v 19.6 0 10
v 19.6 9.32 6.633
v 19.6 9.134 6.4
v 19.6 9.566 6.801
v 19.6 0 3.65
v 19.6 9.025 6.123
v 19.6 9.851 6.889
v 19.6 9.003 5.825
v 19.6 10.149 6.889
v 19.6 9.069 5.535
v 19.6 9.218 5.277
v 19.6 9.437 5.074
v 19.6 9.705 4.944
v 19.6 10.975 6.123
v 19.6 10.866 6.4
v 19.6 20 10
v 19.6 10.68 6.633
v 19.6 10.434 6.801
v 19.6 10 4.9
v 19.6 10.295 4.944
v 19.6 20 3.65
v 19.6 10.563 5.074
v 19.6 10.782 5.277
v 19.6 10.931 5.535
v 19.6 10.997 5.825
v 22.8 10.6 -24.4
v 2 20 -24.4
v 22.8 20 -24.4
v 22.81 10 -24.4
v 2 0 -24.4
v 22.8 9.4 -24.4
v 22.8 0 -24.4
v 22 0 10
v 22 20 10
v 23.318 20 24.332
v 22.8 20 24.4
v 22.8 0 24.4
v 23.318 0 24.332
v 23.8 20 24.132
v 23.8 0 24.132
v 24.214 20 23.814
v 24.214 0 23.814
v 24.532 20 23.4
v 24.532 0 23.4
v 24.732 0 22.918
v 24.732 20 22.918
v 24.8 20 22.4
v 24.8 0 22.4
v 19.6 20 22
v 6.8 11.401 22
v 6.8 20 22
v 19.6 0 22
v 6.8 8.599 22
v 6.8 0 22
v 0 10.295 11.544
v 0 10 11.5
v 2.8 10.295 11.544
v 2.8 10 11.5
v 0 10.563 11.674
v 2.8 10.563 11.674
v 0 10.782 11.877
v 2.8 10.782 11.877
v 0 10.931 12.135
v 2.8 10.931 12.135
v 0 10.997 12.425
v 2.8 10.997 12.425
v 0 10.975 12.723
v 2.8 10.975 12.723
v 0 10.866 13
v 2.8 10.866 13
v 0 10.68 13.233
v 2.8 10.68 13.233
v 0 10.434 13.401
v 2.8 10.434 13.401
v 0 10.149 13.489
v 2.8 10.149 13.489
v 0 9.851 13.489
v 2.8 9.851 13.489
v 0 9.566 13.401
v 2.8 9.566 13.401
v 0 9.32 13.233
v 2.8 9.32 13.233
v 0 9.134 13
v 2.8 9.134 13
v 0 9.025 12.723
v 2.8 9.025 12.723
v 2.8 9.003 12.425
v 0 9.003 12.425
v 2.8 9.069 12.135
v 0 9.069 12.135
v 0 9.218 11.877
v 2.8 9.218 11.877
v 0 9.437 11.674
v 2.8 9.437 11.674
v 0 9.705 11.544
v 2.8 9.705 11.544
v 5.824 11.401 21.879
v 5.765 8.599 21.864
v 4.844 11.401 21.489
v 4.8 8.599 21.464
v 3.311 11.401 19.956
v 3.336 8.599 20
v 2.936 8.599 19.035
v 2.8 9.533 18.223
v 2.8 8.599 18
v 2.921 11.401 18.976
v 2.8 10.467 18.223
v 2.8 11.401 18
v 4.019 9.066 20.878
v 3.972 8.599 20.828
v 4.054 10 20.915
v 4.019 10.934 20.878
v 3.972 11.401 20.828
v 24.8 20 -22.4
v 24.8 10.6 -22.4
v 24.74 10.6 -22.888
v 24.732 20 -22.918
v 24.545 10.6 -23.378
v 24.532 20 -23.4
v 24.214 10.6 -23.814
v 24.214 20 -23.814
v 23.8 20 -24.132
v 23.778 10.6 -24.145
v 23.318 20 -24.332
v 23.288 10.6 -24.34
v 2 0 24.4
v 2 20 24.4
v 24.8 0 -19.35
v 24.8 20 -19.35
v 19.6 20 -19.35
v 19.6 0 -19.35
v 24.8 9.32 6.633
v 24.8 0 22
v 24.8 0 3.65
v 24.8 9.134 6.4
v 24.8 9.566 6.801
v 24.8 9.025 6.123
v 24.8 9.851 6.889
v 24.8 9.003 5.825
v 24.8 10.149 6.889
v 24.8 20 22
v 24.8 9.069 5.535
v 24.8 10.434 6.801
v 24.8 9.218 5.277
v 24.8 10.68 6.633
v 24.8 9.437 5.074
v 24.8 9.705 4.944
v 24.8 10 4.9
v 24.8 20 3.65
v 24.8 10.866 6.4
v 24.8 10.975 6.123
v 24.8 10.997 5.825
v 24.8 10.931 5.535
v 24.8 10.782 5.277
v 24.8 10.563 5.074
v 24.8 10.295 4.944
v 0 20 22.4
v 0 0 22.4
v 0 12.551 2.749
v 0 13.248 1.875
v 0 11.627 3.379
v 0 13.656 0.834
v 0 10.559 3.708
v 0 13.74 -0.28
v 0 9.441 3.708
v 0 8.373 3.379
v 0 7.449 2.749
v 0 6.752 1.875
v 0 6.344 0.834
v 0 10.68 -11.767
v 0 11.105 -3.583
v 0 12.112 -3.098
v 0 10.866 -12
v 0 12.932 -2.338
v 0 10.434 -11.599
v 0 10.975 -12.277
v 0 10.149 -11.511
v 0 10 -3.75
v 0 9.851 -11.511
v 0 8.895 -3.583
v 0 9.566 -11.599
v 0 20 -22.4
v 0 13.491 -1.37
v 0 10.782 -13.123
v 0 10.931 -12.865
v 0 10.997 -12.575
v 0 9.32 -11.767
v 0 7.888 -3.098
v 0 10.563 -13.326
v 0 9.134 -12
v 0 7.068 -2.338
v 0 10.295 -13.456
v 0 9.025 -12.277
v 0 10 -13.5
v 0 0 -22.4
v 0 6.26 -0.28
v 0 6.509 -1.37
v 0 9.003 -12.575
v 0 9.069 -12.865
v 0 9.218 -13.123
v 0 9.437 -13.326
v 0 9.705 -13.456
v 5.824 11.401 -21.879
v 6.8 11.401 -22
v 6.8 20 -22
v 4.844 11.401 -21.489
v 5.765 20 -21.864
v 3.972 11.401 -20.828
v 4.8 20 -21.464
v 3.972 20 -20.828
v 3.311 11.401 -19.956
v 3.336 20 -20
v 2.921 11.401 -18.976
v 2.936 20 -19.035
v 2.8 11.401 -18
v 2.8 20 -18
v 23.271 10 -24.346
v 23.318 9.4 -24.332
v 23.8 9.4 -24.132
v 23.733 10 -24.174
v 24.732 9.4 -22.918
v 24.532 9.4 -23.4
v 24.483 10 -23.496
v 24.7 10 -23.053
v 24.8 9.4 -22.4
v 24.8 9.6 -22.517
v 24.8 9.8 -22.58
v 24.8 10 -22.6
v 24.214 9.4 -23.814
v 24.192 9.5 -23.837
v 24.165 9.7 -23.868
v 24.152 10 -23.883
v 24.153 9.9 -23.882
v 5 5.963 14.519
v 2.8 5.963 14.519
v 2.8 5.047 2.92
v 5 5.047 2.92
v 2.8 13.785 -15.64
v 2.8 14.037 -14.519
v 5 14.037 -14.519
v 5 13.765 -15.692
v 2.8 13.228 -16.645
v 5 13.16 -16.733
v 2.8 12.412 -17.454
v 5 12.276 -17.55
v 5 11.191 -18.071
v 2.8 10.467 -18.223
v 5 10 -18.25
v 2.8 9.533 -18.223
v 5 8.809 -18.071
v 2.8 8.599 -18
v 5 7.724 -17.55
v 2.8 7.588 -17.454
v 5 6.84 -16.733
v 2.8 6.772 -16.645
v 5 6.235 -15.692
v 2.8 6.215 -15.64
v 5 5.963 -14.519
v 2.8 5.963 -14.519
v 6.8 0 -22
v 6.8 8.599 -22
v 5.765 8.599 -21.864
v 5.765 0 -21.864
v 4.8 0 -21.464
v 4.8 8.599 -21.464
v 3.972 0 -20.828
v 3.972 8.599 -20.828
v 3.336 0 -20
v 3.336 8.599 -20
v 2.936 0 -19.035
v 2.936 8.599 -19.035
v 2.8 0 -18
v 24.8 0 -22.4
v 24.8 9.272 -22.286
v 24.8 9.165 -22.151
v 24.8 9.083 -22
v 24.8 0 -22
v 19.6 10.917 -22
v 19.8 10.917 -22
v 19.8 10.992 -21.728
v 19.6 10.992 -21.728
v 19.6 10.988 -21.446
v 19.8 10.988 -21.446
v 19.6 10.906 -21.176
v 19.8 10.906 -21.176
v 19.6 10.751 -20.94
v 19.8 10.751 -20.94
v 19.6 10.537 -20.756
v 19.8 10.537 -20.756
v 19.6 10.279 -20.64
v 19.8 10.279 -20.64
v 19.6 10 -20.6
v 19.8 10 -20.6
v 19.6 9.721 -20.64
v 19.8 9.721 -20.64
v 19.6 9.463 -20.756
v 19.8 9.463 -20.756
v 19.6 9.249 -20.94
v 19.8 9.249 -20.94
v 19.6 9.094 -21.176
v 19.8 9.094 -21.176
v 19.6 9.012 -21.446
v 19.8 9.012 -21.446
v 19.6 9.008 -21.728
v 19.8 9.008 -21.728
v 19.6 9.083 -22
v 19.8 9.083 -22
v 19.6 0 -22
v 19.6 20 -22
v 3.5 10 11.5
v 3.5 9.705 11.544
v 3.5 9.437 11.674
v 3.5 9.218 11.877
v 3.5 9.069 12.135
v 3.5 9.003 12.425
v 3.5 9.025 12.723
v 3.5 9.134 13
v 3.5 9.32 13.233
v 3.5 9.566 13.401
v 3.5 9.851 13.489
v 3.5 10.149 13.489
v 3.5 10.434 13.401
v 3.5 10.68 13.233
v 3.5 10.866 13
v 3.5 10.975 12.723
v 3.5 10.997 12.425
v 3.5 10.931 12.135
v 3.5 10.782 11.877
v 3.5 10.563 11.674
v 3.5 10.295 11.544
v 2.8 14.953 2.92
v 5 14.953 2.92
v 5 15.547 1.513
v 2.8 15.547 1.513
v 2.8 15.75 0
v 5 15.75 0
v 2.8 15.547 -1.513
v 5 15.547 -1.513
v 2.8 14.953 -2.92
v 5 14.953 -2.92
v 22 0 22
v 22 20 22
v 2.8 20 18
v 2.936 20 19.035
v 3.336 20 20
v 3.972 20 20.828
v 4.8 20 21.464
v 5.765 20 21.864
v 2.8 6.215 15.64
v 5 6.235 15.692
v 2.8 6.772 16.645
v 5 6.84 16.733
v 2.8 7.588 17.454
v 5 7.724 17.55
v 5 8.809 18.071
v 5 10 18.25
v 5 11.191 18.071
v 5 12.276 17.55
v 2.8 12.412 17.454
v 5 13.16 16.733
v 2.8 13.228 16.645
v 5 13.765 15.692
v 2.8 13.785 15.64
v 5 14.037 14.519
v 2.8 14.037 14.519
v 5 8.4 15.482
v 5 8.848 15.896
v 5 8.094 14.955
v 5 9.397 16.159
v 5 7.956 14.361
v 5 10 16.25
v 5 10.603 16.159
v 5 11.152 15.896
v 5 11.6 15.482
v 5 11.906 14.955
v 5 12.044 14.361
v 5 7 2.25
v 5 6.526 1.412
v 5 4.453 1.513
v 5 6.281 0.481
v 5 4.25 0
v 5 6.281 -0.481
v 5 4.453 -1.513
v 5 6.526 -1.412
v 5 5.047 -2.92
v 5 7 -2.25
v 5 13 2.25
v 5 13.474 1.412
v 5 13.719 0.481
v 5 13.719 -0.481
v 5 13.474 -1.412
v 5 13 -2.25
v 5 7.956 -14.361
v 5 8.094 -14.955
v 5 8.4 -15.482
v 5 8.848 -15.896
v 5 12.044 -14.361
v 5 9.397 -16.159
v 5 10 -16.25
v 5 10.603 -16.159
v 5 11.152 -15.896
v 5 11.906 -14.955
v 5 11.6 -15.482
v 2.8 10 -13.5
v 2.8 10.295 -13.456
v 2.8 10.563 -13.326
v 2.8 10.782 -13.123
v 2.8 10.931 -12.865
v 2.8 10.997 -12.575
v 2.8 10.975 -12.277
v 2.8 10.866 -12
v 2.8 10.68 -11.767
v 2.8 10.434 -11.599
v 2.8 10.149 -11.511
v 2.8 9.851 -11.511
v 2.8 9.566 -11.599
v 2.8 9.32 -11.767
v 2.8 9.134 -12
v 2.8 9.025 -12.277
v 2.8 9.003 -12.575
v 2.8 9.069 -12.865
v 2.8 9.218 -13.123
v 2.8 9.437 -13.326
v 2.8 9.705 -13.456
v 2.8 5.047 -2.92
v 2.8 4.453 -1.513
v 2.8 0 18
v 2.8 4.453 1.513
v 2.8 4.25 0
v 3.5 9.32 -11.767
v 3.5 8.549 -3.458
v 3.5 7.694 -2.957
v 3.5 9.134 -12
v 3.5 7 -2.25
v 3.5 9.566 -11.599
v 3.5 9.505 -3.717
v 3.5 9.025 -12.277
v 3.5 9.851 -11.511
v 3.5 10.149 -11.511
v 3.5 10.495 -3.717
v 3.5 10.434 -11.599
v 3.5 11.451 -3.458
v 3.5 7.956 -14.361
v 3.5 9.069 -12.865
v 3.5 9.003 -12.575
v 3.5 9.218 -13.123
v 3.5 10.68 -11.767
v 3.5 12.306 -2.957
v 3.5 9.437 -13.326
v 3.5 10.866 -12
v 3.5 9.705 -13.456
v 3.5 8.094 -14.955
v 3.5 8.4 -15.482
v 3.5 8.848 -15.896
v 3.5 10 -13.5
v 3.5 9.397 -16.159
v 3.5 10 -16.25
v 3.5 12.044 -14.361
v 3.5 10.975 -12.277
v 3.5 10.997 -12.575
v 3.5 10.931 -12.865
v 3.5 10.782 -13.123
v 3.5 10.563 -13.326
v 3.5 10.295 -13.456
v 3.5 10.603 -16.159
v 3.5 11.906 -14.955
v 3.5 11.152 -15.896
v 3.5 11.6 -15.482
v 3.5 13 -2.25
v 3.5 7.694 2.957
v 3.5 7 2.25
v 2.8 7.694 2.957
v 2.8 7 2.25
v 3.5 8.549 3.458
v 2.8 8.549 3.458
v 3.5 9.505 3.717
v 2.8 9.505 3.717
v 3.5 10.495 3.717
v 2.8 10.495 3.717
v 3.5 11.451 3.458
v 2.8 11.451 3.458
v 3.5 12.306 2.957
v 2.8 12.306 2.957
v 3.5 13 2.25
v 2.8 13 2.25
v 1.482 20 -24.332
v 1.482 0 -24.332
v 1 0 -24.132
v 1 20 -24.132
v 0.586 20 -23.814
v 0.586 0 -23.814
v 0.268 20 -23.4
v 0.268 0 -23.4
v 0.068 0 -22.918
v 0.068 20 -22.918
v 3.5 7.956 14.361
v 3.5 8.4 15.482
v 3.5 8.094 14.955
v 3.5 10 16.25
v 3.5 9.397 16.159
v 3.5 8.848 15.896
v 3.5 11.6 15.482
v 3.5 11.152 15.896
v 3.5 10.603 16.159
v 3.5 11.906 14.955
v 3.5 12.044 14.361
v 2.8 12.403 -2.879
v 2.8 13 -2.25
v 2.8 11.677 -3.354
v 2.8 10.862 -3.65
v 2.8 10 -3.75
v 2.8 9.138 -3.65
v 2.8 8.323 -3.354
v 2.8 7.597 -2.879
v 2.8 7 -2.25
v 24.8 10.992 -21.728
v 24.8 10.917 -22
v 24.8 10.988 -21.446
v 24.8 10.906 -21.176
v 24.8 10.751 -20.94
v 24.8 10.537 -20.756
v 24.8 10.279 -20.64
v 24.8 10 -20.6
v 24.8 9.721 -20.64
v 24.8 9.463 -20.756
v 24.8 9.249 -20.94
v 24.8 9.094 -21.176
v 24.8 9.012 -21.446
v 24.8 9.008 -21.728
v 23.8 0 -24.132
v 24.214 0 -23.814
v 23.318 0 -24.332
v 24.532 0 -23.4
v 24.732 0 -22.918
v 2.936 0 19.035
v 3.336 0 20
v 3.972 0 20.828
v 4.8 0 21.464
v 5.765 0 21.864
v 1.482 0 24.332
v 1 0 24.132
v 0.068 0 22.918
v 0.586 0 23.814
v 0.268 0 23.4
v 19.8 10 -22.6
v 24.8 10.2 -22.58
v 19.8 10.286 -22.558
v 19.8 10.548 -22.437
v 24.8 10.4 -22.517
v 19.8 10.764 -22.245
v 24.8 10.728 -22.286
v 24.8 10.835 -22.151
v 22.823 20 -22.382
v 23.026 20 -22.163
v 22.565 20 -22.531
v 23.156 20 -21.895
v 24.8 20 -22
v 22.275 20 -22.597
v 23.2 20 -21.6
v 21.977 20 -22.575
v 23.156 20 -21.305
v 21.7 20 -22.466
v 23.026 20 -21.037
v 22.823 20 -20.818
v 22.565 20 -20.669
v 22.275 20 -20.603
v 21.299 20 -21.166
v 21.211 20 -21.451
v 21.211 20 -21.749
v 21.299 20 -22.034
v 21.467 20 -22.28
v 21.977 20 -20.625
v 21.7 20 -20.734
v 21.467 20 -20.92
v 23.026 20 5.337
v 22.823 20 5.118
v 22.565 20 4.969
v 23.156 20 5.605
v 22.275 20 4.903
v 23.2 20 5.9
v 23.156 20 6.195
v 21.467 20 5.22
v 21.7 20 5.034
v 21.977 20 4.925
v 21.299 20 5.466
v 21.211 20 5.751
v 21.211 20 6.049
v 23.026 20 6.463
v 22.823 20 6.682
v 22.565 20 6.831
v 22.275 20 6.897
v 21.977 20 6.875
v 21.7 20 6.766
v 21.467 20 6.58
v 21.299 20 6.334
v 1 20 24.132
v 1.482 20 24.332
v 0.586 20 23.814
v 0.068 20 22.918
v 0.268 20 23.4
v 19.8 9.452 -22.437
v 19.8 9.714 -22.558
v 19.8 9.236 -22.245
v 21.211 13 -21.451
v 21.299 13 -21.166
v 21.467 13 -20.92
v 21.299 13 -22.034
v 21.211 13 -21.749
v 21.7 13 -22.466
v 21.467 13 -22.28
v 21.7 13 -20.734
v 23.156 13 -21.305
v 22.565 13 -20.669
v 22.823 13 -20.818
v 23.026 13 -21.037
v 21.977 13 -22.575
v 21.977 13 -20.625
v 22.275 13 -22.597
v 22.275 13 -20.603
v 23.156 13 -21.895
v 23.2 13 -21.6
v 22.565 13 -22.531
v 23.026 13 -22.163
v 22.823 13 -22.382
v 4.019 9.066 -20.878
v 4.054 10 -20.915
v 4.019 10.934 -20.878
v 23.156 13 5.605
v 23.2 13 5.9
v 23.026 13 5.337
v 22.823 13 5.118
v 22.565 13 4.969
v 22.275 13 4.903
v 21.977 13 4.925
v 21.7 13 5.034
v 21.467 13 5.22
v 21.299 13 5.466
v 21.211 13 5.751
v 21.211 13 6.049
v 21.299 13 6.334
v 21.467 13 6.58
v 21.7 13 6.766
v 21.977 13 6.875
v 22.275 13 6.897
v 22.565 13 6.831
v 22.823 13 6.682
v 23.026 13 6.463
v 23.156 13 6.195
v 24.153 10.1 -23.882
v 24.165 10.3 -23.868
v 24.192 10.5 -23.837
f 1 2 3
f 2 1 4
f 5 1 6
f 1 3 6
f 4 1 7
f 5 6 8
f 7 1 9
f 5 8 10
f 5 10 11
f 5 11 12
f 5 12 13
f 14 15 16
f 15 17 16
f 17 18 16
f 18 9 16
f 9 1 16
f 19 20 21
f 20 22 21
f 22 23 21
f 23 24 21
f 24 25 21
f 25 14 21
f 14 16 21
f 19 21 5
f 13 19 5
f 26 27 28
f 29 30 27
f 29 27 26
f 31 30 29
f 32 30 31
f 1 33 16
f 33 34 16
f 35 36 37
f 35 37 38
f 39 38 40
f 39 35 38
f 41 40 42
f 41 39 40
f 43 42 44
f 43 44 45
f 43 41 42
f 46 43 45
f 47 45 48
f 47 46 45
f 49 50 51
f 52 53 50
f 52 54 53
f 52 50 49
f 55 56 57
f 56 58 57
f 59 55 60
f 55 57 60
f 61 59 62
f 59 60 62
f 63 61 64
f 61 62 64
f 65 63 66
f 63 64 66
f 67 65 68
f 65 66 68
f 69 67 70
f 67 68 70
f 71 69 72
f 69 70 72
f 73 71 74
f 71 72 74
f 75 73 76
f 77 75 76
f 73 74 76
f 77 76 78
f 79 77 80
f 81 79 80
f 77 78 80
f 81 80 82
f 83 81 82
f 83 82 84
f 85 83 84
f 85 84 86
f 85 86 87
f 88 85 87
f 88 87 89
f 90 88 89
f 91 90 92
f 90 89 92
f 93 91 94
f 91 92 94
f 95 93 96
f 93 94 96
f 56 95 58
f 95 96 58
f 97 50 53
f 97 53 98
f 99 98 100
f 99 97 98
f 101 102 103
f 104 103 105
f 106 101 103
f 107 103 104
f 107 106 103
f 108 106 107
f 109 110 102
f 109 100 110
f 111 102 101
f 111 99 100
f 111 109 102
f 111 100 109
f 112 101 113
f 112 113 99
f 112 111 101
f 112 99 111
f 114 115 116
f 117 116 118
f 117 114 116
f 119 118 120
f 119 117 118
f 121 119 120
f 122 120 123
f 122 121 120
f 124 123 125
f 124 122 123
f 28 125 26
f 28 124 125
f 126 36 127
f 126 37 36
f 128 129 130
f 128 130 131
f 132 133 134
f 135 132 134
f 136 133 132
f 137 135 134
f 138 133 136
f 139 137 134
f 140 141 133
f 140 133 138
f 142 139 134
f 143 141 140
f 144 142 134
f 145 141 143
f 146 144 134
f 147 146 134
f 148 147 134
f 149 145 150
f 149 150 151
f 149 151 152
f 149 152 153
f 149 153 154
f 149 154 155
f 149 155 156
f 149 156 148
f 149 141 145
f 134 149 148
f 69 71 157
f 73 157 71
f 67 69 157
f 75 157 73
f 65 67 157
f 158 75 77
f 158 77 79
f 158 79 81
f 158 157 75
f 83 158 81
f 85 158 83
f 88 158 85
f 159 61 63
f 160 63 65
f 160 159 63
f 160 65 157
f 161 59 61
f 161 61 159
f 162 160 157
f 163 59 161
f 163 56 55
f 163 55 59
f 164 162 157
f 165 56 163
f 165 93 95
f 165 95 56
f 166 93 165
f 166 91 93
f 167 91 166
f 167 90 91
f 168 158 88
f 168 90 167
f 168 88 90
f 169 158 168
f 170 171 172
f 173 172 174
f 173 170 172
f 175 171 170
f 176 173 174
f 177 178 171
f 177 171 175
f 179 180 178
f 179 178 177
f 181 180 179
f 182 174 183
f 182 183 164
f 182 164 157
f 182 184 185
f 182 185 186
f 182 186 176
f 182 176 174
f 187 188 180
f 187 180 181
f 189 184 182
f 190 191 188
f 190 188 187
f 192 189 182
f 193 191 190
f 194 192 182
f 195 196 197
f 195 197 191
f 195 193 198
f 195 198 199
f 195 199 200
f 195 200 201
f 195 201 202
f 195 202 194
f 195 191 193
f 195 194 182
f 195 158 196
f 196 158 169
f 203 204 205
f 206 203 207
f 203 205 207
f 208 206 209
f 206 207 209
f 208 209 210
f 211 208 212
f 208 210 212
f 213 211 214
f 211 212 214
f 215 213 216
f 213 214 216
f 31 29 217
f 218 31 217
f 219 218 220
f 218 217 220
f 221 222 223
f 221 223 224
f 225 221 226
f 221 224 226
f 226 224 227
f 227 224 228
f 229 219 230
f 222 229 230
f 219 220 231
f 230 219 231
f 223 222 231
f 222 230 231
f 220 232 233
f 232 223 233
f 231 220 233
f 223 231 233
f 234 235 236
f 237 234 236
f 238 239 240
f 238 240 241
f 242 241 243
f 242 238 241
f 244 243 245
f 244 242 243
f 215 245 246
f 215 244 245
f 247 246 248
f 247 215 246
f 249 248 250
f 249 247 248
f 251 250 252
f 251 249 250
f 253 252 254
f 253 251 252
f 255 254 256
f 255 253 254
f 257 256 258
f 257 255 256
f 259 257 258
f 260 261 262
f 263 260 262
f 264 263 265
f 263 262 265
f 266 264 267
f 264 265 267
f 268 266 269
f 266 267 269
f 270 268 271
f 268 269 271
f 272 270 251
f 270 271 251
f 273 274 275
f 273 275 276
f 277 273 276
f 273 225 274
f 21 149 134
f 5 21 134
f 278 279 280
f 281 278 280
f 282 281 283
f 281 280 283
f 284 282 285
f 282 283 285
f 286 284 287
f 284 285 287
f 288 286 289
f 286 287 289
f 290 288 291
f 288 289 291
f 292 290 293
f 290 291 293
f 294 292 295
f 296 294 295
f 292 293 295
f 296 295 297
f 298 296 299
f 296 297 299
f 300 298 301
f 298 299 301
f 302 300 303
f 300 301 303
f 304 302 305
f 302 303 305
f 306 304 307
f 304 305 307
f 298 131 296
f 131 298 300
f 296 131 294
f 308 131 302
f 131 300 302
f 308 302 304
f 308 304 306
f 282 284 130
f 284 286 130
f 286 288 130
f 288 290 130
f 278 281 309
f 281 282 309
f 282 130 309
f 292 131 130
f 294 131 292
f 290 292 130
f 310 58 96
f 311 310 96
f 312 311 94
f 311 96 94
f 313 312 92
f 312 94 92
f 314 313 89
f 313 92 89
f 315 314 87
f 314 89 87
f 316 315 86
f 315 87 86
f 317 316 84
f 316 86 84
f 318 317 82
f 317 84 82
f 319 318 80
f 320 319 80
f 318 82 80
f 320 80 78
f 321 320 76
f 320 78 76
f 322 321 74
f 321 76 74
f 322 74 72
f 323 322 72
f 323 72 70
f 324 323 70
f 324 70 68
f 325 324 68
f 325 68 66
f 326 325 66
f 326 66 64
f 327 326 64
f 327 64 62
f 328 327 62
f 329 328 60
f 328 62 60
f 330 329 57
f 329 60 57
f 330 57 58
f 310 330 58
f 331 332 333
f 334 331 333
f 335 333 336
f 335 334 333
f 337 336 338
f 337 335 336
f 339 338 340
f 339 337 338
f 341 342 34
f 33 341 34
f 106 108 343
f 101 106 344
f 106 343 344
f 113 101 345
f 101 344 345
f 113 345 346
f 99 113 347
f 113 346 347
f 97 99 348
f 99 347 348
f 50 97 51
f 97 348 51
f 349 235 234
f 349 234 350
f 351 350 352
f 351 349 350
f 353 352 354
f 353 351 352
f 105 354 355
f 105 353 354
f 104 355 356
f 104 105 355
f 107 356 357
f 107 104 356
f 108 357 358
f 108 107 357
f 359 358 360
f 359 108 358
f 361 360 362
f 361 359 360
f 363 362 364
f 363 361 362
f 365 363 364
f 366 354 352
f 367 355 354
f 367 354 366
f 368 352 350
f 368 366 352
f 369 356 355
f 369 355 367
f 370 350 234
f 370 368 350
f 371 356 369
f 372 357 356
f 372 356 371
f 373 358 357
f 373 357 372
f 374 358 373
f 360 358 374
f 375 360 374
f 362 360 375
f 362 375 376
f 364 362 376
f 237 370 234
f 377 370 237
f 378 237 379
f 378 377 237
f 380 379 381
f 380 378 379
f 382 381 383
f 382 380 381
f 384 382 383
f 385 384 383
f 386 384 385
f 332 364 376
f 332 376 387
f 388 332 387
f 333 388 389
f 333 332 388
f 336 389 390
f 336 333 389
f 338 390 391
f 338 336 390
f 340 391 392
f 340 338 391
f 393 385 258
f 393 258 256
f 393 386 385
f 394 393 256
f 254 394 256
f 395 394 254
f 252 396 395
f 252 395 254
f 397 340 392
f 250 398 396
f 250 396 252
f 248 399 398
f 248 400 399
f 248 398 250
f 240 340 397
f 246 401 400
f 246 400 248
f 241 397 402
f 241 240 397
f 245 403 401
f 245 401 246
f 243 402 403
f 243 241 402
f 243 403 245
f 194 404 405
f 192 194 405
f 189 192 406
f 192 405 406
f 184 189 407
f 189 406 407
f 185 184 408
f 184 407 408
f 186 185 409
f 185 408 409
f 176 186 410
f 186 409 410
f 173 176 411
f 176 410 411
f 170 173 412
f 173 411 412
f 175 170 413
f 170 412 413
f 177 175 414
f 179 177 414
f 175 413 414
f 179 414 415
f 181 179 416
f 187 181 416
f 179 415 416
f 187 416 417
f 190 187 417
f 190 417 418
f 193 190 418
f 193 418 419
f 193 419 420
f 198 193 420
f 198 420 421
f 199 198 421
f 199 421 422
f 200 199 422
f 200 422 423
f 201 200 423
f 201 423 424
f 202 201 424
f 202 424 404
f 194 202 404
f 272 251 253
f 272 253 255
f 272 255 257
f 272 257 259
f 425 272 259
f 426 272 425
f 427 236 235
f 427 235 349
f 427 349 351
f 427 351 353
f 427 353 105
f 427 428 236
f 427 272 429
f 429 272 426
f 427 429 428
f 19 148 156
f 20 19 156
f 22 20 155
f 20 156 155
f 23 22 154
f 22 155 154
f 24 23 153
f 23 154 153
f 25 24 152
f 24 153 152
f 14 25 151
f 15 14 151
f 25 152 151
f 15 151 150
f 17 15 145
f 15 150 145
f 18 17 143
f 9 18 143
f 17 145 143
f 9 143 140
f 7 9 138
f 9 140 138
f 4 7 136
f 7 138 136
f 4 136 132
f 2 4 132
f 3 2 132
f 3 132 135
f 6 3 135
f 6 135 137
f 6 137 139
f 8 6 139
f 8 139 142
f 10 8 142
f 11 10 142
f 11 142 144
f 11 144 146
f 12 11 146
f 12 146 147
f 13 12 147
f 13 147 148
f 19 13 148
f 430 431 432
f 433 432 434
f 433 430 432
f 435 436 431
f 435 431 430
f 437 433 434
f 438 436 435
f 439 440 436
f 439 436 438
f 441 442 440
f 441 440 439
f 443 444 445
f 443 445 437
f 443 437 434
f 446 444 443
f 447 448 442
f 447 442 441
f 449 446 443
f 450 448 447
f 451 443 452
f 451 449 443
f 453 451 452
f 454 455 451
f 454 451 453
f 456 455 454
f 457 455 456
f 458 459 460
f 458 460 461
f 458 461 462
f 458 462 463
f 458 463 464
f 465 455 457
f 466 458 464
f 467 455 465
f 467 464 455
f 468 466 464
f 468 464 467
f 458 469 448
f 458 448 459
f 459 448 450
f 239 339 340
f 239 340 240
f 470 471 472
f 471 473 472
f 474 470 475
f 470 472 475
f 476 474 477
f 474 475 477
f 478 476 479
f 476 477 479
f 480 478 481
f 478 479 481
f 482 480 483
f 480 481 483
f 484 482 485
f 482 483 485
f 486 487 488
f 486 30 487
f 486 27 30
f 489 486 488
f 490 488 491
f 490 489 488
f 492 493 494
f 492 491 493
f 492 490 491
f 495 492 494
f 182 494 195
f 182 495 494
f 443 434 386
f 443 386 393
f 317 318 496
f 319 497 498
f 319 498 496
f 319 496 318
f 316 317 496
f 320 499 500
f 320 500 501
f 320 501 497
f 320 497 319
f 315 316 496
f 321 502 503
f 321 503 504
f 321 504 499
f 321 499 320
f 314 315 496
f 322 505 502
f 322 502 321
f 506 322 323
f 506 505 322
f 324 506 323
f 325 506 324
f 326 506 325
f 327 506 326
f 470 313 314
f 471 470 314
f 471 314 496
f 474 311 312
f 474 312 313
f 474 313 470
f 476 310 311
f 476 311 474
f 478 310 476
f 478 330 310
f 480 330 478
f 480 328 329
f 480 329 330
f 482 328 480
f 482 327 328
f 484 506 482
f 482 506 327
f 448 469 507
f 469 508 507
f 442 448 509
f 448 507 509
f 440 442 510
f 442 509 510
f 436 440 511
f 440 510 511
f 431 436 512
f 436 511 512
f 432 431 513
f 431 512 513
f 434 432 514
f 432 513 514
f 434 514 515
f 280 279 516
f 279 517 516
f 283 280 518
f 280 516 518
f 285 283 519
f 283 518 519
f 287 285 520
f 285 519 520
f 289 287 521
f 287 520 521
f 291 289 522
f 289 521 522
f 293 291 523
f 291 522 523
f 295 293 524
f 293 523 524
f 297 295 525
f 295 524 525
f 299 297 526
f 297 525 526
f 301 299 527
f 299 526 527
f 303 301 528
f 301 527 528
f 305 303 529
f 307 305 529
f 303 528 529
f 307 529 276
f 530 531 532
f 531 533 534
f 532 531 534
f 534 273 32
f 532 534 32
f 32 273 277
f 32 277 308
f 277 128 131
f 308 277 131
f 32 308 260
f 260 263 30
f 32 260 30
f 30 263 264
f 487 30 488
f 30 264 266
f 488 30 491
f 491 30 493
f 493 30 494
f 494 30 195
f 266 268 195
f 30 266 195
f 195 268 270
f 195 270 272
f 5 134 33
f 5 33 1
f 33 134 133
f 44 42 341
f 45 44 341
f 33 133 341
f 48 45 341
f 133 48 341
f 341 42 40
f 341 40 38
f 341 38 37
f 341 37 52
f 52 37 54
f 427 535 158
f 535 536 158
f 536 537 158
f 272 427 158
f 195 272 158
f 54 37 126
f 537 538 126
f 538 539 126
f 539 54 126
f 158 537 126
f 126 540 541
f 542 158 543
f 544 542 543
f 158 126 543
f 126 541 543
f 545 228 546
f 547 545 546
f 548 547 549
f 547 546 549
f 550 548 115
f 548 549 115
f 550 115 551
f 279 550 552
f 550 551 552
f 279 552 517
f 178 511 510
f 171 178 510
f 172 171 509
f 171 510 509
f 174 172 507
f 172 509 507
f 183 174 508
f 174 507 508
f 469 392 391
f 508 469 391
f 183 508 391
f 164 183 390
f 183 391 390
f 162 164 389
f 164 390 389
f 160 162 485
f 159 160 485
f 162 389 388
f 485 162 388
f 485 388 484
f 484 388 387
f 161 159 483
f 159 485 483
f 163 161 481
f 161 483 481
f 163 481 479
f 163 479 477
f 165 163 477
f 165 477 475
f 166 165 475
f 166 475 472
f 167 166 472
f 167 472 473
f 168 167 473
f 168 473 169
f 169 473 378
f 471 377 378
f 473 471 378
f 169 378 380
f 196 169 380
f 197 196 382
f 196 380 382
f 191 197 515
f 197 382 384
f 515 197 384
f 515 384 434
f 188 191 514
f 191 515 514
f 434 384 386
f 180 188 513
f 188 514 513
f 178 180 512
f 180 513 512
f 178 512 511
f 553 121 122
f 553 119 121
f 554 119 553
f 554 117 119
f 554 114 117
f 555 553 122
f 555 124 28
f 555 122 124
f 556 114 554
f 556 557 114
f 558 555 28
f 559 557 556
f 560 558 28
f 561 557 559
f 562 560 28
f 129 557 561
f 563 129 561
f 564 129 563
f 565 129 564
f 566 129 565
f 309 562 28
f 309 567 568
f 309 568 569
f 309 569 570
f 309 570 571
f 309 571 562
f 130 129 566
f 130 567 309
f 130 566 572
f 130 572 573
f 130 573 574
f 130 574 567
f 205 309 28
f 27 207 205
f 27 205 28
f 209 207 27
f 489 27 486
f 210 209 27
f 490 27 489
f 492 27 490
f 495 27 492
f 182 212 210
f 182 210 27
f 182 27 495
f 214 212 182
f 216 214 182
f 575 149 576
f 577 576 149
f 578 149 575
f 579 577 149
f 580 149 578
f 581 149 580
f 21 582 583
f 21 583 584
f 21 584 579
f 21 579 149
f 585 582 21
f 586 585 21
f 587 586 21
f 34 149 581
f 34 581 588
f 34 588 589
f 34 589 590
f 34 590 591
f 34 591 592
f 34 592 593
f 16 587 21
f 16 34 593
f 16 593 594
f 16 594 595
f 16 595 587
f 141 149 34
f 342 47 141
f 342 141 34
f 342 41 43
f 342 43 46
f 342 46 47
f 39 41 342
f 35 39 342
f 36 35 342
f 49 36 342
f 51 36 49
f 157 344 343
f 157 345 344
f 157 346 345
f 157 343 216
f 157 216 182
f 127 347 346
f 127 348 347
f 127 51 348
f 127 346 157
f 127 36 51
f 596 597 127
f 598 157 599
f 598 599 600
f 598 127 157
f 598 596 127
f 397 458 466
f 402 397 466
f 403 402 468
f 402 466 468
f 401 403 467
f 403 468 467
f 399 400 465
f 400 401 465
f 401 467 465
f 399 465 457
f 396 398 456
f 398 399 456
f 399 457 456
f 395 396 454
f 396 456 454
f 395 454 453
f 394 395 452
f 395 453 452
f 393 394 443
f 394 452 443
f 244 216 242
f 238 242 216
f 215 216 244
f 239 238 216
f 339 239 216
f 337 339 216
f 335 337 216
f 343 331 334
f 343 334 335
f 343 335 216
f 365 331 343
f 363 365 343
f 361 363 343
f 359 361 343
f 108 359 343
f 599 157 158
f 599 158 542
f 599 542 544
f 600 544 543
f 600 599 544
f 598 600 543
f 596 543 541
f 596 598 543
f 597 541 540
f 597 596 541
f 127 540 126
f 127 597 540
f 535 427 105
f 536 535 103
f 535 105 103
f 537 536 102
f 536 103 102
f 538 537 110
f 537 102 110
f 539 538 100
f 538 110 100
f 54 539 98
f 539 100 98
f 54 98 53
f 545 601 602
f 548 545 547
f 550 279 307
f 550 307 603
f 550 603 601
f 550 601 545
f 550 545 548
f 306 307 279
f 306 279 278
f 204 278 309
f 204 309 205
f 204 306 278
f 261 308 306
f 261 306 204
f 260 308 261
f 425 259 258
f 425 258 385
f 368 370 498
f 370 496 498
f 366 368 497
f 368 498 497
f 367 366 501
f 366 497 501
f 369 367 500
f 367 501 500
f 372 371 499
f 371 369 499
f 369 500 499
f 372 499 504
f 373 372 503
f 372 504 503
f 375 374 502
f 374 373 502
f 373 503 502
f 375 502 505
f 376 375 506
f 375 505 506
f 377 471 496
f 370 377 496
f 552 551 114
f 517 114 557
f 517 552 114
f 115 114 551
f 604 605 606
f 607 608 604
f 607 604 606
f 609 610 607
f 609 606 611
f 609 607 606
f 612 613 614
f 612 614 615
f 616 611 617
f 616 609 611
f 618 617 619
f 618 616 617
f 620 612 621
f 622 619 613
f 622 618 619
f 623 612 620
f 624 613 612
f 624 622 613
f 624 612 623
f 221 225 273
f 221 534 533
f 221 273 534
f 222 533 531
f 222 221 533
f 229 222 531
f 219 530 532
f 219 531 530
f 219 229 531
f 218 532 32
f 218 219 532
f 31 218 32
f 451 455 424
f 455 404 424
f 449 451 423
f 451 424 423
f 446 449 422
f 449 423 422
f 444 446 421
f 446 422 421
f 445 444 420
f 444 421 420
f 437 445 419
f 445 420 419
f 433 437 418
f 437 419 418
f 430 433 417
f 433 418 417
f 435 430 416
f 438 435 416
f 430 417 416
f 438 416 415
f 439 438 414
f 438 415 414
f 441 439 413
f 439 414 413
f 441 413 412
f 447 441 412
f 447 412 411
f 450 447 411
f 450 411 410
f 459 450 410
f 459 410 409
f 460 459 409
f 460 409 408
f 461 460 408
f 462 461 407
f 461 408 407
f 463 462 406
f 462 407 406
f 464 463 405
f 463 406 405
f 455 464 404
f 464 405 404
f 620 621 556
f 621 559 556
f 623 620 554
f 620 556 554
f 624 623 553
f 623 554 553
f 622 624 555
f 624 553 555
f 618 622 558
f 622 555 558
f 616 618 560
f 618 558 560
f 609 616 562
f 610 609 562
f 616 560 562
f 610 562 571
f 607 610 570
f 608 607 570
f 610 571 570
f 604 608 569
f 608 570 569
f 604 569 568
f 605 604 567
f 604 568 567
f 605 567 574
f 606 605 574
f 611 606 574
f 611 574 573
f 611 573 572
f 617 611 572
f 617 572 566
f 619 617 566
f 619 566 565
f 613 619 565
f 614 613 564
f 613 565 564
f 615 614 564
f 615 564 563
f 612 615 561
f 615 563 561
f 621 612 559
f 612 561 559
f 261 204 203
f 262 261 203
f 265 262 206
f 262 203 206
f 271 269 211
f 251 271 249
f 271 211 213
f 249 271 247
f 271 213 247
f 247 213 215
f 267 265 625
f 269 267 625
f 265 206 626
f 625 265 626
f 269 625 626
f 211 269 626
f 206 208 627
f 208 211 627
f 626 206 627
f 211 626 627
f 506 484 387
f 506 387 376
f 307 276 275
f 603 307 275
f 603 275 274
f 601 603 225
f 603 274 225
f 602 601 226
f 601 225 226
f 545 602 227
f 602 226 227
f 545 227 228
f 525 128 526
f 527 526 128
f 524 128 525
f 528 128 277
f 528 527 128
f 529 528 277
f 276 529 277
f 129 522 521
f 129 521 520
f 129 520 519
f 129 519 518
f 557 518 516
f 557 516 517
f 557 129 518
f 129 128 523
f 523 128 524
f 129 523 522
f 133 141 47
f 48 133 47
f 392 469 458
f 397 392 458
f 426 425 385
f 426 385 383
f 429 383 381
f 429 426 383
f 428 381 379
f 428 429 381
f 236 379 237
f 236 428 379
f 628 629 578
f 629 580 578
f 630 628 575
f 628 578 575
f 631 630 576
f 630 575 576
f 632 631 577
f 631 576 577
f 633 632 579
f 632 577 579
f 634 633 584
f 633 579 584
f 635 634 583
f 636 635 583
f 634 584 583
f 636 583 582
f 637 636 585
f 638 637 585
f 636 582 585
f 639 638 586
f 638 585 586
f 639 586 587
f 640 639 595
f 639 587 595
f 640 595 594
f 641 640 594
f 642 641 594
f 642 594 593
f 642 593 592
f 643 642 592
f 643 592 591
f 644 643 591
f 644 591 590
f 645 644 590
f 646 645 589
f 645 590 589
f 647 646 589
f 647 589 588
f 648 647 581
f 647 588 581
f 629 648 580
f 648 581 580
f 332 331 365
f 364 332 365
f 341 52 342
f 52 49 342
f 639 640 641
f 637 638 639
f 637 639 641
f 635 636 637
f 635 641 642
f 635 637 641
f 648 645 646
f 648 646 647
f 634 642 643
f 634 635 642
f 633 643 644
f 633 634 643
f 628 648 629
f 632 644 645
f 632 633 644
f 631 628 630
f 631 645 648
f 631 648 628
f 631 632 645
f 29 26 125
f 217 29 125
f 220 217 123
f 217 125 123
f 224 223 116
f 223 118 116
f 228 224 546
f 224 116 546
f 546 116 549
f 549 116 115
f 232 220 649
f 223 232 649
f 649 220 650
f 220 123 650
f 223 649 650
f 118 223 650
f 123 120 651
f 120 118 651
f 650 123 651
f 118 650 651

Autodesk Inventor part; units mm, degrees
ref_plane "YZ Plane" through (0, 0, 0) normal (1, 0, 0) x (0, 1, 0)
ref_plane "XZ Plane" through (0, 0, 0) normal (0, 1, 0) x (-1, 0, 0)
ref_plane "XY Plane" through (0, 0, 0) normal (0, 0, 1) x (1, 0, 0)
sketch "スケッチ1" plane through (0, 0, 0) normal (0, 1, 0) x (-1, 0, 0)
  line L0 (34.0614, 0) -> (-44.6235, 0)
  line L1 (0, 24.4) -> (0, -24.4)
  line L2 (0, -24.4) -> (-24.8, -24.4)
  line L3 (-24.8, -24.4) -> (-24.8, -22)
  line L4 (-24.8, -22) -> (-2.8, -22)
  line L5 (-2.8, -22) -> (-2.8, 22)
  line L6 (-2.8, 22) -> (-24.8, 22)
  line L7 (-24.8, 22) -> (-24.8, 24.4)
  line L8 (-24.8, 24.4) -> (0, 24.4)
  point P0 (0, 0)
  dimension "d0" = 2.8
  dimension "d1" = 48.8
  dimension "d2" = 24.4
  dimension "d3" = 2.4
  dimension "d4" = 2.4
  dimension "d5" = 22
extrude "押し出し1" add sketch "スケッチ1" along normal blind 20
sketch "スケッチ2" plane through (2.8, 0, 22) normal (1, 0, 0) x (0, 0, -1)
  line L0 (0, 20) -> (44, 20) projected
  line L1 (22, 20) -> (22, 0)
  line L2 (0, 0) -> (44, 0) projected
  line L3 (-2.4, 0) -> (-2.4, 20) projected
  line L4 (-2.4, 10) -> (46.4, 10)
  line L5 (46.4, 0) -> (46.4, 20) projected
  circle A0 centre (22, 10) radius 3.75
  arc A1 (7.6386, 12.0436) -> (7.6386, 7.9564) centre (7.8, 10) ccw
  line L6 (19.75, 13) -> (7.6386, 12.0436)
  line L7 (19.75, 7) -> (7.6386, 7.9564)
  circle A2 centre (9.5, 10) radius 1
  arc A3 (36.3614, 7.9564) -> (36.3614, 12.0436) centre (36.2, 10) ccw
  line L8 (24.25, 13) -> (36.3614, 12.0436)
  line L9 (24.25, 7) -> (36.3614, 7.9564)
  circle A4 centre (34.5, 10) radius 1
  line L10 (19.0799, 14.9533) -> (7.4812, 14.0374)
  arc A5 (7.4812, 14.0374) -> (7.4812, 5.9626) centre (7.8, 10) ccw
  line L11 (7.4812, 5.9626) -> (19.0799, 5.0467)
  circle A6 centre (22, 10) radius 5.75
  line L12 (24.9201, 14.9533) -> (36.5188, 14.0374)
  arc A7 (36.5188, 5.9626) -> (36.5188, 14.0374) centre (36.2, 10) ccw
  line L13 (36.5188, 5.9626) -> (24.9201, 5.0467)
  point P0 (18.25, 10)
  point P1 (22, 6.25)
  point P2 (24.25, 13)
  point P3 (24.25, 7)
  point P4 (19.75, 7)
  point P5 (27.0332, 12.7802)
  point P6 (27.0332, 7.2198)
  point P7 (16.9668, 12.7802)
  point P8 (16.9668, 7.2198)
  dimension "d9" = 7.5
  dimension "d8" = 24.4
  dimension "d10" = 6
  dimension "d11" = 14.2
  dimension "d12" = 2.05
  dimension "d13" = 2
  dimension "d14" = 12.5
  dimension "d34" = 2
  dimension "d35" = 2
  dimension "d36" = 2
extrude "押し出し2" cut sketch "スケッチ2" against normal through all contours A0 L4 L1 | L1 L4 A0 | L4 A0 L1 | L1 A0 L4 | A4 L4 | L4 A4 | A2 L4 | L4 A2
extrude "押し出し6" add sketch "スケッチ2" along normal blind 2.2 contours A6 L8 A0 L1 | L1 A0 L6 A6 | L12 A7 L4 A3 L8 A6 | A6 L6 A1 L4 A5 L10 | A0 L9 A6 L1 | L1 A6 L7 A0 | A7 L13 A6 L9 A3 L4 | L4 A1 L7 A6 L11 A5
extrude "押し出し3" add sketch "スケッチ2" along normal blind 0.7 contours L8 A6 L4 A0 | A0 L4 A6 L6 | L8 A3 L4 A4 A6 | A6 L4 A2 A1 L6 | A0 L7 A6 L4 | L4 A6 L9 A0 | L4 A4 A3 L9 A6 | A6 L7 A1 L4 A2
sketch "スケッチ3" plane through (24.8, 0, -22) normal (1, 0, 0) x (0, 0, -1)
  line L0 (-46.4, 0) -> (-46.4, 20) projected
  line L1 (2.4, 0) -> (-46.4, 0) projected
  line L2 (-46.4, 20) -> (-25.65, 20)
  line L3 (-25.65, 20) -> (-25.65, 0)
  line L4 (-25.65, 0) -> (-46.4, 0)
  line L5 (-46.4, 0) -> (-46.4, 20)
  line L6 (2.4, 20) -> (-46.4, 20) projected
  line L7 (2.4, 20) -> (-2.65, 20)
  line L8 (-2.65, 20) -> (-2.65, 0)
  line L9 (-2.65, 0) -> (2.4, 0)
  line L10 (2.4, 0) -> (2.4, 20)
  line L11 (-46.4, 10) -> (2.4, 10)
  line L12 (-19.4, 20) -> (-19.4, 0)
  circle A0 centre (-27.9, 10) radius 1
  circle A1 centre (-0.4, 10) radius 1
  point P0 (-22, 0)
  point P1 (-2.65, 20)
  point P2 (-2.65, 0)
  point P3 (2.4, 0)
  dimension "d19" = 27
  dimension "d20" = 6.25
  dimension "d21" = 16.75
  dimension "d22" = 2.25
  dimension "d23" = 2.25
  dimension "d24" = 2
extrude "押し出し4" add sketch "スケッチ3" against normal blind 5.2 contours L0 L11 A0 L3 L1 | L0 L2 L3 L11 A0 | L8 L11 A1 L10 L1 | L8 L6 L10 L11 A1
extrude "押し出し8" cut sketch "スケッチ3" against normal blind 5 contours A1 L11 | L11 A1
sketch "スケッチ4" plane through (0, 20, 0) normal (0, 1, 0) x (1, 0, 0)
  line L0 (22.2, 20.9661) -> (22.2, -25.0757)
  line L1 (19.6, -22) -> (19.6, -3.65) projected
  circle A0 centre (22.2, -5.9) radius 1
  circle A1 centre (22.2, 21.6) radius 1
  line L2 (24.8, -3.65) -> (19.6, -3.65) projected
  line L3 (24.8, 19.35) -> (19.6, 19.35) projected
  line L4 (24.8, -24.4) -> (24.8, -3.65) projected
  point P0 (0, 0)
  point P1 (24.8, -24)
  dimension "d28" = 2.6
  dimension "d29" = 2.25
  dimension "d30" = 2
  dimension "d31" = 2.25
extrude "押し出し5" cut sketch "スケッチ4" against normal blind 7
sketch "スケッチ5" plane through (0, 20, 0) normal (0, 1, 0) x (1, 0, 0)
  line L0 (19.6, -22) -> (2.8, -22) projected
  line L1 (19.6, -22) -> (22, -22)
  line L2 (22, -22) -> (22, -10)
  line L3 (22, -10) -> (19.6, -10)
  line L4 (19.6, -22) -> (19.6, -3.65) projected
  line L5 (24.8, -24.4) -> (24.8, -3.65) projected
  point P0 (0, 0)
  dimension "d39" = 2.8
  dimension "d40" = 12
extrude "押し出し7" cut sketch "スケッチ5" against normal through all
fillet "フィレット2" radius 2 2 edges at (0, 10, 24.4) (0, 10, -24.4)
fillet "フィレット4" radius 2 2 edges at (24.8, 10, 24.4) (24.8, 10, -24.4)
fillet "フィレット5" radius 4 1 edges at (2.8, 10, -22)
fillet "フィレット6" radius 4 1 edges at (2.8, 10, 22)
properties part number "joint4"
